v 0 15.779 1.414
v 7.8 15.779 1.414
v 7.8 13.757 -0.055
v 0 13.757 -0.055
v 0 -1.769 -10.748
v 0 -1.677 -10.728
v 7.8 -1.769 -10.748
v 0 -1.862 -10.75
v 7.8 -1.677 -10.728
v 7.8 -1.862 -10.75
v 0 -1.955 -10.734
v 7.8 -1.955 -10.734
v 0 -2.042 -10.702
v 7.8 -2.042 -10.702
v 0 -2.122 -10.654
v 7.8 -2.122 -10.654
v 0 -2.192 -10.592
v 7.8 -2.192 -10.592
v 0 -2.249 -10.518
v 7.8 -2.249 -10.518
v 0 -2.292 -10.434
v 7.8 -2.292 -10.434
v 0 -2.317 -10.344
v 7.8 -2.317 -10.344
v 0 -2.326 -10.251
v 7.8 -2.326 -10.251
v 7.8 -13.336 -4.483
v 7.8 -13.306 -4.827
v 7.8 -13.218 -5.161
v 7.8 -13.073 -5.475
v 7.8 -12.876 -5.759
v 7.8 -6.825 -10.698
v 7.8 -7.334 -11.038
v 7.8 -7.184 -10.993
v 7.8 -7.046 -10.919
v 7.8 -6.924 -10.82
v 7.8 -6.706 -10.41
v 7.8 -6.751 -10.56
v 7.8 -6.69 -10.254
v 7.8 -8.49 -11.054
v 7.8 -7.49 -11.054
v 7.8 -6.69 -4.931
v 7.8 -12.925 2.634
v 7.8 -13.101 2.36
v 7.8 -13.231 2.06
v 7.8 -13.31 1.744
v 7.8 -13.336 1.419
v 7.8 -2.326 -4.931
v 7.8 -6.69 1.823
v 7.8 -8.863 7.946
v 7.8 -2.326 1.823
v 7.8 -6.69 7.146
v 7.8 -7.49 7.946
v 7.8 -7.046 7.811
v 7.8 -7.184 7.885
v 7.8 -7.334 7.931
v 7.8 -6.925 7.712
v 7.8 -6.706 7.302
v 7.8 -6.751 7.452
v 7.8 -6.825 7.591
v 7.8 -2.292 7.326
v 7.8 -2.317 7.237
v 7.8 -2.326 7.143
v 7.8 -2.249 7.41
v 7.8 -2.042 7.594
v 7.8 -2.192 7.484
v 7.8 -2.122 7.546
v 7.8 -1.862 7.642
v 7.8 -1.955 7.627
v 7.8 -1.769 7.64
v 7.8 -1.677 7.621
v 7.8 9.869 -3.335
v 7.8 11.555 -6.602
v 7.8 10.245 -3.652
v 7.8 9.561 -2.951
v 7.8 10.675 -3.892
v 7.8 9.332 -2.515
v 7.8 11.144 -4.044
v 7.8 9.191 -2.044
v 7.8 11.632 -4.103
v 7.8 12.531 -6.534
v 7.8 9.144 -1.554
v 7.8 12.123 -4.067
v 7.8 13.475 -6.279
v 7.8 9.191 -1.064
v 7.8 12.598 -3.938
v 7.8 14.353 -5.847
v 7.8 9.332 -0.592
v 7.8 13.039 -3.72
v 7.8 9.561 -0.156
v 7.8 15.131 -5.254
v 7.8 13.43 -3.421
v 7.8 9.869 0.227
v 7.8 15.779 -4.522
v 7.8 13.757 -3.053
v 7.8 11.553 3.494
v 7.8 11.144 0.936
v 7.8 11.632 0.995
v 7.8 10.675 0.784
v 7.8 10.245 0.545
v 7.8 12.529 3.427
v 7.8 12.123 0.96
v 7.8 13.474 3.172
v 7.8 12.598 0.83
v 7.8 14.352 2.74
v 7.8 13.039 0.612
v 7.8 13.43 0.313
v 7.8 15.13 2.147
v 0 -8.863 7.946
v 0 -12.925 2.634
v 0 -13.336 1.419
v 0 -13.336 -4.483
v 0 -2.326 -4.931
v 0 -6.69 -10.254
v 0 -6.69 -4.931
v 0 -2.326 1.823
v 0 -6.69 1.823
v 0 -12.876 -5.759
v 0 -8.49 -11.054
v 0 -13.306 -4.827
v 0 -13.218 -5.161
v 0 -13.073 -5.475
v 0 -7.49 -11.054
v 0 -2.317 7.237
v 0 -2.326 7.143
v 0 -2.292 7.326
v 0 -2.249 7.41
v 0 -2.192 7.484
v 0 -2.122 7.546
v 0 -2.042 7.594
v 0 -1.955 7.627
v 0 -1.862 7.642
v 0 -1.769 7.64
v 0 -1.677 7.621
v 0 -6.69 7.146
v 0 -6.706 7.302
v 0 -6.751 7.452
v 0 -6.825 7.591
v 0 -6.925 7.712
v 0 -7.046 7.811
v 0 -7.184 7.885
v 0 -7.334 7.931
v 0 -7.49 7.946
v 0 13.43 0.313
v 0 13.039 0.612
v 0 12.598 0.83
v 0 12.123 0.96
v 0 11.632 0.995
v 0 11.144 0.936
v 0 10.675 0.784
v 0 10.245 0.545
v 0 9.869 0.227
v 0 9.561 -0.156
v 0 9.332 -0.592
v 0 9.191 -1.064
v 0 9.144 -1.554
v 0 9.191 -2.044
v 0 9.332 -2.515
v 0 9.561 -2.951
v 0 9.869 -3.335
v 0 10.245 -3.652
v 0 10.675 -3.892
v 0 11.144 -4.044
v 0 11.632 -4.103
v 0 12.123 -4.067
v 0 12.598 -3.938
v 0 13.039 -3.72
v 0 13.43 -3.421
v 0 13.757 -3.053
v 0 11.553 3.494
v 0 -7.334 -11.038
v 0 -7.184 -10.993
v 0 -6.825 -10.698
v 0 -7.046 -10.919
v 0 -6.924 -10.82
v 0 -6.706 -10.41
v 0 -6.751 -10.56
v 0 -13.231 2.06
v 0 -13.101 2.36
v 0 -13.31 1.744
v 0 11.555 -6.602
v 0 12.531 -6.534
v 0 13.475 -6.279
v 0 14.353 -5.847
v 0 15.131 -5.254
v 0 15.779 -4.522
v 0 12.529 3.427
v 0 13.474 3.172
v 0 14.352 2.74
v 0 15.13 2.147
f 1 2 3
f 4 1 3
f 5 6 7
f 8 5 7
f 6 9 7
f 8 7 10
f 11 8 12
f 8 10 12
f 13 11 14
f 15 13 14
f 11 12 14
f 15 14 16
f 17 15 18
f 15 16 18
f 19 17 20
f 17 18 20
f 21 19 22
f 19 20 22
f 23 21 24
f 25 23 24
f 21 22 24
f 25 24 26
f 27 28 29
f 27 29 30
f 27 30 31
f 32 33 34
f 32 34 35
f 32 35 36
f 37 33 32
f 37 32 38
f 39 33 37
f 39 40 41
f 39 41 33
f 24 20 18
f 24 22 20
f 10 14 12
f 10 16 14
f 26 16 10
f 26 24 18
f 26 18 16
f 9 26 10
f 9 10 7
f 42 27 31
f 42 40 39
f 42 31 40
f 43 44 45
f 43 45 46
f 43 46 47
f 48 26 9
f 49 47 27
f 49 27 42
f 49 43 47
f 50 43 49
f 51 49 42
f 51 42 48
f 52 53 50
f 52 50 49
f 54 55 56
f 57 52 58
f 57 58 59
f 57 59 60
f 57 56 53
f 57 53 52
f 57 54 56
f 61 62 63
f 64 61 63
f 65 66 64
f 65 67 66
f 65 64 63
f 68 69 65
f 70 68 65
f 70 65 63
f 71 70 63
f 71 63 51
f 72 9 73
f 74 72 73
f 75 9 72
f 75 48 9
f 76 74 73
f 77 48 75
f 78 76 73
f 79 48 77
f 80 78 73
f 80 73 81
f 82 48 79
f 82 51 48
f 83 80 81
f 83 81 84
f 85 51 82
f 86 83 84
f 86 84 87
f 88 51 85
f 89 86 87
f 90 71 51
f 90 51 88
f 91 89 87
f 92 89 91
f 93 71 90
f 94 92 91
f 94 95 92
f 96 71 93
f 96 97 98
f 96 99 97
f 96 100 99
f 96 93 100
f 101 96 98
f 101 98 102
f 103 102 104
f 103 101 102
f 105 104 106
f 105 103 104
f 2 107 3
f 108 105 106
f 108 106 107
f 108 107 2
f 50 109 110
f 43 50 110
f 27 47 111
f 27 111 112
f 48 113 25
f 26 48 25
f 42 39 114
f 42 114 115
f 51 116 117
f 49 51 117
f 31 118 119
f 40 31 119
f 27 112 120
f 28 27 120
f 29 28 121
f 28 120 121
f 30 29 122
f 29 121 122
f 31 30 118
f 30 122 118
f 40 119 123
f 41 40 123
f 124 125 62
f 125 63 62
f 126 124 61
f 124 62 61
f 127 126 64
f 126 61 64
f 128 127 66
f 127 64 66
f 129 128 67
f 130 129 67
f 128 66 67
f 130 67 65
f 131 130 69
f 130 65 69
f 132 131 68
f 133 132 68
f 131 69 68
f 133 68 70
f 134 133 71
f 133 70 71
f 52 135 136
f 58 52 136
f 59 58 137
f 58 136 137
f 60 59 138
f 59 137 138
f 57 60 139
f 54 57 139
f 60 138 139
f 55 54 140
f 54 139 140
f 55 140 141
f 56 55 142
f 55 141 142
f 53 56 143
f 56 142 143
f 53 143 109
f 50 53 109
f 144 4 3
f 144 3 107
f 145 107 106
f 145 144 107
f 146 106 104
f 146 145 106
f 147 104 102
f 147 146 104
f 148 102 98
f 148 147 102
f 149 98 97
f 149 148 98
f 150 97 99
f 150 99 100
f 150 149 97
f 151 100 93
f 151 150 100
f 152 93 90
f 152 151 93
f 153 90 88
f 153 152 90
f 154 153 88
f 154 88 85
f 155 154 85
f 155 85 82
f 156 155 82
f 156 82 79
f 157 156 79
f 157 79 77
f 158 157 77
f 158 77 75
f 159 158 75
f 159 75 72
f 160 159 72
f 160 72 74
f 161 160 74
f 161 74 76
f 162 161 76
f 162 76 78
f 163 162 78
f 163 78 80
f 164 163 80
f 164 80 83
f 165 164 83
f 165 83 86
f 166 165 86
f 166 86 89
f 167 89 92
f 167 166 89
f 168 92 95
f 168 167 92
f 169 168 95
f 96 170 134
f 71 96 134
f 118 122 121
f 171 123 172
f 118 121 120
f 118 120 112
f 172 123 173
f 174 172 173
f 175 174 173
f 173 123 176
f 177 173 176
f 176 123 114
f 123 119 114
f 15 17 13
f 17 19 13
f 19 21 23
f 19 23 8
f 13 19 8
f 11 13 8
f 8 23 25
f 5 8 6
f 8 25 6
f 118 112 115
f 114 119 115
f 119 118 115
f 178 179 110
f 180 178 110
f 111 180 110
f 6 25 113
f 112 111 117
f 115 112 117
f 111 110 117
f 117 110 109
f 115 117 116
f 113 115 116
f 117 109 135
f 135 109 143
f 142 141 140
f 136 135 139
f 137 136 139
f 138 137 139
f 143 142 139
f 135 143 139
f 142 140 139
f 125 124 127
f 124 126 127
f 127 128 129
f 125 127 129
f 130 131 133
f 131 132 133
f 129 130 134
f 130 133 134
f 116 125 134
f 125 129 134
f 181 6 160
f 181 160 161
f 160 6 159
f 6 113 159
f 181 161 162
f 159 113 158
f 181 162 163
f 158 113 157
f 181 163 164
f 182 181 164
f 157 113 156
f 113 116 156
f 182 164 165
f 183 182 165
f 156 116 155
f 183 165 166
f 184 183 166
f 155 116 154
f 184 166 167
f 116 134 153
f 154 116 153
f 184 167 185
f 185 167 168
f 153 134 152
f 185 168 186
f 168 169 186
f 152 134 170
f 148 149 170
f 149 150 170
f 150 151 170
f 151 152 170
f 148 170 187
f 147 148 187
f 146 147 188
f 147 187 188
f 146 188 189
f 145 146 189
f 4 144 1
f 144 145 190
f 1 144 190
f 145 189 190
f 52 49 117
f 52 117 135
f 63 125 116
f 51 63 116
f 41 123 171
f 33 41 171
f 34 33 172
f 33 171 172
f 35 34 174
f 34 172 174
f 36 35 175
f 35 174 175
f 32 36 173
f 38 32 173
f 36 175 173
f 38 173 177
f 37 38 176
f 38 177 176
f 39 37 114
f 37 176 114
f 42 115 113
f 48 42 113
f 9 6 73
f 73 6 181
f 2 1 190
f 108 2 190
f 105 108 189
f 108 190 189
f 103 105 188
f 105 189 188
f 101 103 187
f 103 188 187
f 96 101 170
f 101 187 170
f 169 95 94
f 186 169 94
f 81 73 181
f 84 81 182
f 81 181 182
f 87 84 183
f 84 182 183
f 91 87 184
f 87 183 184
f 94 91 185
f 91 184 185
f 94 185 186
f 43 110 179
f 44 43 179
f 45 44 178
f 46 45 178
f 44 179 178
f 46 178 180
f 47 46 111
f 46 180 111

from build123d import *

# Parameters (mm, degrees)
F0_R     = 2.55
F1_DEPTH = 7.8
F2_R     = 0.5
F4_DEPTH = 25


with BuildPart() as f1:
    # F0 (on Right) → F1 (new body)
    with BuildSketch(Plane.YZ):
        with BuildLine():
            Line((-2.326186, 7.823175), (-2.326186, 1.823175))
            Line((-2.326186, 1.823175), (-6.690186, 1.823175))
            Line((-6.690186, 1.823175), (-6.690186, 7.146175))
            ThreePointArc((-6.690186, 7.146175), (-6.9245, 7.71186), (-7.490186, 7.946175))
            Line((-7.490186, 7.946175), (-8.86261, 7.946175))
            Line((-8.86261, 7.946175), (-12.92499, 2.634016))
            ThreePointArc((-12.92499, 2.634016), (-13.23068, 2.06042), (-13.336295, 1.419089))
            Line((-13.336295, 1.419089), (-13.336295, -4.483028))
            ThreePointArc((-13.336295, -4.483028), (-13.217831, -5.161131), (-12.876472, -5.758903))
            Line((-12.876472, -5.758903), (-8.490186, -11.053825))
            Line((-8.490186, -11.053825), (-7.490186, -11.053825))
            ThreePointArc((-7.490186, -11.053825), (-6.9245, -10.819511), (-6.690186, -10.253825))
            Line((-6.690186, -10.253825), (-6.690186, -4.930825))
            Line((-6.690186, -4.930825), (-2.326186, -4.930825))
            Line((-2.326186, -4.930825), (-2.326186, -10.930825))
            Line((-2.326186, -10.930825), (11.55518, -6.601922))
            ThreePointArc((11.55518, -6.601922), (16.743814, -1.552504), (11.552539, 3.494198))
            Line((11.552539, 3.494198), (-2.326186, 7.823175))
        make_face()
        with Locations((11.693814, -1.553825)):
            Circle(F0_R, mode=Mode.SUBTRACT)
    extrude(amount=F1_DEPTH)

    # F2
    f2_edges = [f1.edges().sort_by_distance(p)[0] for p in [
        (3.9, -2.326186, 7.823175),
        (3.9, -2.326186, -10.930825),
    ]]
    fillet(f2_edges, radius=F2_R)

    # F3 (on face) → F4 (cut)
    with BuildSketch(Plane.YZ.offset(7.8)):
        Polygon((19.312905, 3.981768), (11.693814, -1.553825), (19.312905, -7.089419), align=None)
    extrude(amount=-F4_DEPTH, mode=Mode.SUBTRACT)


solid = f1.part
